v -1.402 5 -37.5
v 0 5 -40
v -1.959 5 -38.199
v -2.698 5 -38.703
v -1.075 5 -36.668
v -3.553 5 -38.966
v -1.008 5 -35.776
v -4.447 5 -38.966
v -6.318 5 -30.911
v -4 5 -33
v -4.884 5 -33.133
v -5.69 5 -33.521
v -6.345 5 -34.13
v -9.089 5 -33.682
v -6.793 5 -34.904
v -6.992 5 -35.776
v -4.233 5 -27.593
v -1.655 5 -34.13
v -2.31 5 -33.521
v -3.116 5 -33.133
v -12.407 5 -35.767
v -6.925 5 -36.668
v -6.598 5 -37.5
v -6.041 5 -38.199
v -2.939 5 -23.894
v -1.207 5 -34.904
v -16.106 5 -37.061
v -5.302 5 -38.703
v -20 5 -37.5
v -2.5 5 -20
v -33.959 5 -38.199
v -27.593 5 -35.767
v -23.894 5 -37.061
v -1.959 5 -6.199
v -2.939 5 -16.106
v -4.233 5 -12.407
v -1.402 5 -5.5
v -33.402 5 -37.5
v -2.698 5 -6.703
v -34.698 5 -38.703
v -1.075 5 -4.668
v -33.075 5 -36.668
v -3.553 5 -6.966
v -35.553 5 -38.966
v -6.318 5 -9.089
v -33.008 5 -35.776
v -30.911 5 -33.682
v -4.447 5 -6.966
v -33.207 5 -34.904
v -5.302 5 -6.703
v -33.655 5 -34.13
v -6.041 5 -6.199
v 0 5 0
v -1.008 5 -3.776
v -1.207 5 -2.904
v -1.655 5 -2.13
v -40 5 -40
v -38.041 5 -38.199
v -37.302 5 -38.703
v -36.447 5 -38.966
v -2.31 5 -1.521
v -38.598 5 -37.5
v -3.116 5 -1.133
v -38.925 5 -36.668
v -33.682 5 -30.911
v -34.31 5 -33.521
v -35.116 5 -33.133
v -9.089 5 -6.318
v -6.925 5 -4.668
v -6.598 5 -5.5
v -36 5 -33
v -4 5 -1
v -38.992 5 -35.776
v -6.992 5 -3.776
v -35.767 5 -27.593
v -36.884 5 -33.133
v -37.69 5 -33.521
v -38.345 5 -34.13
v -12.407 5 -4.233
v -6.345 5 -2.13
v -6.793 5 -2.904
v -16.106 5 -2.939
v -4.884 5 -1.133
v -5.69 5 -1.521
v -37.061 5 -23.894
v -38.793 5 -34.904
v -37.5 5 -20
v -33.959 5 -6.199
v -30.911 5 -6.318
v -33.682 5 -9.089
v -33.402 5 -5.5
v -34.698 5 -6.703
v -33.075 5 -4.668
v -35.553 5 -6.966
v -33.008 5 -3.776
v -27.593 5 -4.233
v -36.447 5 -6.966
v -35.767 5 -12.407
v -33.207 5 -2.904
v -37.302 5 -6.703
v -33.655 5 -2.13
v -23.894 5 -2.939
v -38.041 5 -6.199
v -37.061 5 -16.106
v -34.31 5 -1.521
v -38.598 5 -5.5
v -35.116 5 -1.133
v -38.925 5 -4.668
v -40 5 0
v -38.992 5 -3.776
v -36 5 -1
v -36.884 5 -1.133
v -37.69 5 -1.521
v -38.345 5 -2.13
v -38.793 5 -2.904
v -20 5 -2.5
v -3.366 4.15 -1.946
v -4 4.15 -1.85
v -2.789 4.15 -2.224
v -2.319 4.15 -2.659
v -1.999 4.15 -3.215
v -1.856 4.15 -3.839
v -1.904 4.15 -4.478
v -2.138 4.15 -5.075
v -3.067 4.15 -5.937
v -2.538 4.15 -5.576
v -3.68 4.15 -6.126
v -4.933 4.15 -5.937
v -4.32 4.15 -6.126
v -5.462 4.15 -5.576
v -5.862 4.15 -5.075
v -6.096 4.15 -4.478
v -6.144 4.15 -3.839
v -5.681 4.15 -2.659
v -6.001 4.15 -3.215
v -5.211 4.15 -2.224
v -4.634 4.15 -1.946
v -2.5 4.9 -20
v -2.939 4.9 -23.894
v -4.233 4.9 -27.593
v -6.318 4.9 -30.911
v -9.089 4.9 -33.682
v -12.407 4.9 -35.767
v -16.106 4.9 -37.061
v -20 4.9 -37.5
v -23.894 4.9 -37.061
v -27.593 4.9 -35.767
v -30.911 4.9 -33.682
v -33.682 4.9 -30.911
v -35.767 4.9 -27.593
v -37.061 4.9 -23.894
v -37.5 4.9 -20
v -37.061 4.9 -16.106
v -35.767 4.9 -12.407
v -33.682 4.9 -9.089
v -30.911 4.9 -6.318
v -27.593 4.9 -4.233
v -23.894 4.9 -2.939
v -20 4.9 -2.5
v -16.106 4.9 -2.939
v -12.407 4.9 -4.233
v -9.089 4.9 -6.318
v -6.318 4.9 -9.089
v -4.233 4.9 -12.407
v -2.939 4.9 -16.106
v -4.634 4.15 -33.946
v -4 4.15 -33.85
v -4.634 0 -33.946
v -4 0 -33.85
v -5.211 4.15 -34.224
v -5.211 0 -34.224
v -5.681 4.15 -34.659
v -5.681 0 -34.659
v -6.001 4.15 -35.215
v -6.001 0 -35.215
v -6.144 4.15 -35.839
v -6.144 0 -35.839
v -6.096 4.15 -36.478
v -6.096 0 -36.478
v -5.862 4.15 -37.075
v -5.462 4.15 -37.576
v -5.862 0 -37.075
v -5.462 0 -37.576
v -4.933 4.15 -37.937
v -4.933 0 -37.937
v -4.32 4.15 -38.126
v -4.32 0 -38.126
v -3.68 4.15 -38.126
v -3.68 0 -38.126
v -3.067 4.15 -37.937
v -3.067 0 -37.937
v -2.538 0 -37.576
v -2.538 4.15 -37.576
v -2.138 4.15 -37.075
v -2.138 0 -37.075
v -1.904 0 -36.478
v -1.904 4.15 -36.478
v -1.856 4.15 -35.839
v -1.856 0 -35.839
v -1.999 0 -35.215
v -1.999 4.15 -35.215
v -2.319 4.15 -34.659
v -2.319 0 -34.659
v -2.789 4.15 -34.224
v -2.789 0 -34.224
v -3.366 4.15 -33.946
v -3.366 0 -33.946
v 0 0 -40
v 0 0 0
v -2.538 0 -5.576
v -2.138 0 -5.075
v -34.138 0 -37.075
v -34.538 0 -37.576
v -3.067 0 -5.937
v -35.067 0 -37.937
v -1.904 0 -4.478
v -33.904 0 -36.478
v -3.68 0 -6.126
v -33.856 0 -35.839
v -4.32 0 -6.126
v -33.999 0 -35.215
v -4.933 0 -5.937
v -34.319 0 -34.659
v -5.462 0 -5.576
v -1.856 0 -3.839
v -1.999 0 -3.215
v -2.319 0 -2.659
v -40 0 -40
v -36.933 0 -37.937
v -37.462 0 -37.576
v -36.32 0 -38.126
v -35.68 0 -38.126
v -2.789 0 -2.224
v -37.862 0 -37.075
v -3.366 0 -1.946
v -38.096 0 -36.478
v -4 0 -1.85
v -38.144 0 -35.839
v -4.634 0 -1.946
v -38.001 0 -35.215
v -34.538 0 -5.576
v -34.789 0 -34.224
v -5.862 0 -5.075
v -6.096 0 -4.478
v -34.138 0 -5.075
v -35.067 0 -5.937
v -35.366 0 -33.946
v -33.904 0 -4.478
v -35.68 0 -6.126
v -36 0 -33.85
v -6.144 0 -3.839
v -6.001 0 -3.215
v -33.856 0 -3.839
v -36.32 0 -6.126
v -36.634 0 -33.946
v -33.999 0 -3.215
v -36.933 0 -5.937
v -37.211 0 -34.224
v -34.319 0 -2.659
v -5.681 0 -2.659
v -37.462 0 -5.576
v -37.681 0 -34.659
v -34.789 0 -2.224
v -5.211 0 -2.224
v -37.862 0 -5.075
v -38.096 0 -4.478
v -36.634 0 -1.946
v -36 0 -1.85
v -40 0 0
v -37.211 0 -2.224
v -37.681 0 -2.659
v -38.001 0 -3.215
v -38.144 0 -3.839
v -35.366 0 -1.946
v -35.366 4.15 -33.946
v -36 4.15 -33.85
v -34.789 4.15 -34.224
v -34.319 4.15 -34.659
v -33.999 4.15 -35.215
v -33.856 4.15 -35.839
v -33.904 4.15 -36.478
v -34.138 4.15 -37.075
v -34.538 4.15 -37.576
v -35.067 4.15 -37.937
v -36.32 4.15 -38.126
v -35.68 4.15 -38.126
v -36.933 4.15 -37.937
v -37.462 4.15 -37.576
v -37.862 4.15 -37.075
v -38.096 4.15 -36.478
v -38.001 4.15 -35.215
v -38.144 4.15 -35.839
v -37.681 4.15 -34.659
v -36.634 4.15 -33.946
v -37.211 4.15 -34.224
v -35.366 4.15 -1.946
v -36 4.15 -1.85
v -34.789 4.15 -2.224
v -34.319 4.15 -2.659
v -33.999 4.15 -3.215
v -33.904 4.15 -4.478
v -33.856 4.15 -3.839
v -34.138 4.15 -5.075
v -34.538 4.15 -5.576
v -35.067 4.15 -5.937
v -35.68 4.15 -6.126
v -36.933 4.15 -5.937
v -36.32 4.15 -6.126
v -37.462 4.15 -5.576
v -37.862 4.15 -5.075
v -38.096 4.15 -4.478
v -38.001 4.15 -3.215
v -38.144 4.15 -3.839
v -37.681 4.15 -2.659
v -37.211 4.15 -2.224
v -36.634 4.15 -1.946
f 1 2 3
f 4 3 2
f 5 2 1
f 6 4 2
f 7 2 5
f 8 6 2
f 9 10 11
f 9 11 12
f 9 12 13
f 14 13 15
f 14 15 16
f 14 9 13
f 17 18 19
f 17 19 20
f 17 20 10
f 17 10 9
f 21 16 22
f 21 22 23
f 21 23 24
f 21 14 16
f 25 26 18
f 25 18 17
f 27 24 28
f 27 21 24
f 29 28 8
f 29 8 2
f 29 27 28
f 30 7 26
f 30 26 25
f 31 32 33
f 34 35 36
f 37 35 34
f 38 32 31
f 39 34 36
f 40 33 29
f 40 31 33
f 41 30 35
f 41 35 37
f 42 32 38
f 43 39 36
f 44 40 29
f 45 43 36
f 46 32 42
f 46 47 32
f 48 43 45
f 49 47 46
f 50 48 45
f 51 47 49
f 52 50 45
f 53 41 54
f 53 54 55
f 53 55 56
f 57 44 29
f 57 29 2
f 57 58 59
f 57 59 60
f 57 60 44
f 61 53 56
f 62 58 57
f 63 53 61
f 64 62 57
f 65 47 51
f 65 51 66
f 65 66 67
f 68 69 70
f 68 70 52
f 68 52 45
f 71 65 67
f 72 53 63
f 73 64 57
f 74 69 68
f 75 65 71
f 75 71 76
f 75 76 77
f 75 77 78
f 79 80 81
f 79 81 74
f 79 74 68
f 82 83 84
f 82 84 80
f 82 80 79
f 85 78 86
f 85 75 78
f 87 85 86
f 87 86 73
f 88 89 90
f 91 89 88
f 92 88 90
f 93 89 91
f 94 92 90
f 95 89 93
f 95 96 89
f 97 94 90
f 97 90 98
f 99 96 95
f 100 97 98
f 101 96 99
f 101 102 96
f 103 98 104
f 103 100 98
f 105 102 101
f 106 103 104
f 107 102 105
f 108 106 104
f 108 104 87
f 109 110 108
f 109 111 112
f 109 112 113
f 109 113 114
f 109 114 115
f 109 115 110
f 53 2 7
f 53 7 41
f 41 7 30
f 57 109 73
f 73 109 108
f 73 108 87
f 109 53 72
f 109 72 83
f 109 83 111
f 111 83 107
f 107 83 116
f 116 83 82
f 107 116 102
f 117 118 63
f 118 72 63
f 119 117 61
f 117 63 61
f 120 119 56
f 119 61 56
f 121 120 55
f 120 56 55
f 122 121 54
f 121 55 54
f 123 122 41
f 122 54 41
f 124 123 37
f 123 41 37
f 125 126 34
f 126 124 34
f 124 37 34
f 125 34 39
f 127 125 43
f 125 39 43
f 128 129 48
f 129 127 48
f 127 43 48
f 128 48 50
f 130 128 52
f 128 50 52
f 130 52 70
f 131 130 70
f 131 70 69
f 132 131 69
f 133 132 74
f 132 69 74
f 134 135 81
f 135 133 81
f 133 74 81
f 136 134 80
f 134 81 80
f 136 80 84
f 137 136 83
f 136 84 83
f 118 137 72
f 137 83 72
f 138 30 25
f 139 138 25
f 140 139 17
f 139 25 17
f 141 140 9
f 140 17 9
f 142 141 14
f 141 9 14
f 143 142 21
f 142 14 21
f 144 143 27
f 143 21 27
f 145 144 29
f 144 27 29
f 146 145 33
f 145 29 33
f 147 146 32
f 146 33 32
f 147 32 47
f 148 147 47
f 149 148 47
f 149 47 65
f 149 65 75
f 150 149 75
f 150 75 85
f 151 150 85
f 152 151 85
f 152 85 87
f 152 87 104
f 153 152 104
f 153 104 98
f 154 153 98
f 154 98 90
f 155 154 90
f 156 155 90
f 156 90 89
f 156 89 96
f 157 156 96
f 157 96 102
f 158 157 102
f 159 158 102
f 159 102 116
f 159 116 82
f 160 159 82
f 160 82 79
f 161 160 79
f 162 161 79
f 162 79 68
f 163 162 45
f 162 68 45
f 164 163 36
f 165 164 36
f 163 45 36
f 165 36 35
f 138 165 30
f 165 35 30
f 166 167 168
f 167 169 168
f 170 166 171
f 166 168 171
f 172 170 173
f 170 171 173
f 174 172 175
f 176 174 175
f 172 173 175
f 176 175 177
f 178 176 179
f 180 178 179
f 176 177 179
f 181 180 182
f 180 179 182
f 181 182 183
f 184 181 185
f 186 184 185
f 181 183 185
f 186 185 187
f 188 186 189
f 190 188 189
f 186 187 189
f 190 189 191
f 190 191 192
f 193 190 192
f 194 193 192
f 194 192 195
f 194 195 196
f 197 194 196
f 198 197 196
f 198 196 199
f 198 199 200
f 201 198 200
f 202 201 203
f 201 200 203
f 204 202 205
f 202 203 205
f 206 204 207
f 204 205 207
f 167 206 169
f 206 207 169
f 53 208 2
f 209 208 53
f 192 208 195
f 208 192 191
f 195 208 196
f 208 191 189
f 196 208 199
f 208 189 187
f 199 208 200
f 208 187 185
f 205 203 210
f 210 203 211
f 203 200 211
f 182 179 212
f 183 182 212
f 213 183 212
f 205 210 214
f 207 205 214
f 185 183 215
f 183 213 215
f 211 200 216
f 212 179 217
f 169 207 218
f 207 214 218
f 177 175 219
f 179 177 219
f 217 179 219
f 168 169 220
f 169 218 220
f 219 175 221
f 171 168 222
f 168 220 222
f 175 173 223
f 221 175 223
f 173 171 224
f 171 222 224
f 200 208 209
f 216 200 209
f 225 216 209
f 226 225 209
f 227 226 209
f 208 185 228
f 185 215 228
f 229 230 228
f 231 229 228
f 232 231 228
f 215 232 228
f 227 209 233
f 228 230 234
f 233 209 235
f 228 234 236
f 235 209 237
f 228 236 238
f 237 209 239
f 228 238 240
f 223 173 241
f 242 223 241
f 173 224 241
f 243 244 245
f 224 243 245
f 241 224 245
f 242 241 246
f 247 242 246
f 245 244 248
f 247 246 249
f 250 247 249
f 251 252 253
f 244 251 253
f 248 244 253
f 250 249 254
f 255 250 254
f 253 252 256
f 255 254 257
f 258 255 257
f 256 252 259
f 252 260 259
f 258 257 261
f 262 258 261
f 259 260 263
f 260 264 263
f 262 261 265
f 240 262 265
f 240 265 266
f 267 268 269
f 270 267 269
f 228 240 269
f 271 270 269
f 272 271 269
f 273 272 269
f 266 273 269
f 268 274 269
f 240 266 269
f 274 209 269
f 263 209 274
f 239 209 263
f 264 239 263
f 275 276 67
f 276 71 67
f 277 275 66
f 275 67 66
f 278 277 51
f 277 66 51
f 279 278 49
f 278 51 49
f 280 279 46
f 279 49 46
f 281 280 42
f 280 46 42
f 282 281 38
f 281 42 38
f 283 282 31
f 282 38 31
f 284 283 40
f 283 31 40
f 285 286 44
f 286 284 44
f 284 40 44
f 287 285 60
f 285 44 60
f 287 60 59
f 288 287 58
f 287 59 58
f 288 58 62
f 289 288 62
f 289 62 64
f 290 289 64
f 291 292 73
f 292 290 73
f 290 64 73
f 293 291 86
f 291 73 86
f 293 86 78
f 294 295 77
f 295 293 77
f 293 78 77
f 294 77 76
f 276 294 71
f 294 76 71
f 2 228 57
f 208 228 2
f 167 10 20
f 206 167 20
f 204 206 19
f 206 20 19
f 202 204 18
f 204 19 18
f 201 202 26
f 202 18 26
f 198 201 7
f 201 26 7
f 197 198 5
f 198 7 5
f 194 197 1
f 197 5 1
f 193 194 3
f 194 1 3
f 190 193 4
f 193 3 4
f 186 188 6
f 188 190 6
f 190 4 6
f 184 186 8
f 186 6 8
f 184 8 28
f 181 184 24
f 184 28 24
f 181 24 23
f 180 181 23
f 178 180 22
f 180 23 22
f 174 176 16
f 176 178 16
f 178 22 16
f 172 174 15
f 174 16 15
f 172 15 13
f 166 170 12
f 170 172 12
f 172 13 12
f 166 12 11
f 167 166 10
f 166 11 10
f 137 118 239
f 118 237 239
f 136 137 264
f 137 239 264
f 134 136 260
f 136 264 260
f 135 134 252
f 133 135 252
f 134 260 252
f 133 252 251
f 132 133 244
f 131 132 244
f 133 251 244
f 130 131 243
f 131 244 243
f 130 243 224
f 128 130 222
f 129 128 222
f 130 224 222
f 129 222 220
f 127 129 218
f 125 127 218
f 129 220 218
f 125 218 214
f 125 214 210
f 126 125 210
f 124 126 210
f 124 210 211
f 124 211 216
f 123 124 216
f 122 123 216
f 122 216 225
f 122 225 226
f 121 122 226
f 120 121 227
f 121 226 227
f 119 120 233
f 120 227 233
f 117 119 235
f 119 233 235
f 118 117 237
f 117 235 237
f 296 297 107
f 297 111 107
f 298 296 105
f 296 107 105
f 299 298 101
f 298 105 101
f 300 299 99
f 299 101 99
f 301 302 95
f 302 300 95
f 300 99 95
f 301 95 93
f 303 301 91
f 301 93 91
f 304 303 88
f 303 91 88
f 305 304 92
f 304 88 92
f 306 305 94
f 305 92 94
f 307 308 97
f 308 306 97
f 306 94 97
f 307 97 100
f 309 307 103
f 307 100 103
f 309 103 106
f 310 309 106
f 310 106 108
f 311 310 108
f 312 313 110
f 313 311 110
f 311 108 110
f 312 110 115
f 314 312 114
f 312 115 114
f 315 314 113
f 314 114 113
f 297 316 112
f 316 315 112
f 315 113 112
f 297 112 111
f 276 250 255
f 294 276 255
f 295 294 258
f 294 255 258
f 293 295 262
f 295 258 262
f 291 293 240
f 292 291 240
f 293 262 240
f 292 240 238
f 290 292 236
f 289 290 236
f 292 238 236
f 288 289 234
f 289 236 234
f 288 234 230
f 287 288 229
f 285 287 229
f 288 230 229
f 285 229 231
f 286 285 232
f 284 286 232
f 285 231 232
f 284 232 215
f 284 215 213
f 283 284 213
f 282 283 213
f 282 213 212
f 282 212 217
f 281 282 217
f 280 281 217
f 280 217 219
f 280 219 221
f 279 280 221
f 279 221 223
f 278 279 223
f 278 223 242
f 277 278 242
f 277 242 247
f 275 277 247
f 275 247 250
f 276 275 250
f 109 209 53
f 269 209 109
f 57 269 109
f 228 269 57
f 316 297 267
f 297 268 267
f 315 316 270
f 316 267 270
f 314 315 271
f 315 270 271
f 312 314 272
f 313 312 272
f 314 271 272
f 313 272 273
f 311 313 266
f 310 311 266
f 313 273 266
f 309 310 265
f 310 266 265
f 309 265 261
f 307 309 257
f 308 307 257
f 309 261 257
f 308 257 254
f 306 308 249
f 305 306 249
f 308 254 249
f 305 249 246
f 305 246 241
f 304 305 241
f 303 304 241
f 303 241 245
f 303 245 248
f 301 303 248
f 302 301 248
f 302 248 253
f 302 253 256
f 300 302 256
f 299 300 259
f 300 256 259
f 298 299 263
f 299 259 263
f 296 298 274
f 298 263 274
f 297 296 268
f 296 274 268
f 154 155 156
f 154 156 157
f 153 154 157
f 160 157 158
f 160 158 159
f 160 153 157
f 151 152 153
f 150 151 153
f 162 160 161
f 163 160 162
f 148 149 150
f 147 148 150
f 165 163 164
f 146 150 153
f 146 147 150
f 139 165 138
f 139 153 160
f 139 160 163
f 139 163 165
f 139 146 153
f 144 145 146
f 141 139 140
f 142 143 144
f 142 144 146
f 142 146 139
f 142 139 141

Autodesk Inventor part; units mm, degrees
ref_plane "YZ Plane" through (0, 0, 0) normal (1, 0, 0) x (0, 1, 0)
ref_plane "XZ Plane" through (0, 0, 0) normal (0, 1, 0) x (-1, 0, 0)
ref_plane "XY Plane" through (0, 0, 0) normal (0, 0, 1) x (1, 0, 0)
sketch "Sketch1" plane through (0, 0, 0) normal (0, 1, 0) x (-1, 0, 0)
  line L0 (0, 0) -> (40, 0)
  line L1 (40, 0) -> (40, -40)
  line L2 (40, -40) -> (0, -40)
  line L3 (0, -40) -> (0, 0)
  dimension "d0" = 40
  dimension "d1" = 40
extrude "Extrusion1" add sketch "Sketch1" along normal blind 5
sketch "Sketch2" plane through (0, 5, 0) normal (0, 1, 0) x (1, 0, 0)
  line L0 (-40, 0) -> (0, 0) projected
  line L1 (0, 0) -> (0, 40) projected
  line L2 (0, 40) -> (-40, 40) projected
  line L3 (-40, 40) -> (-40, 0) projected
  point P0 (-4, 4)
  point P1 (-4, 36)
  point P2 (-36, 36)
  point P3 (-36, 4)
  dimension "d4" = 4
  dimension "d6" = 4
  dimension "d7" = 4
  dimension "d8" = 4
  dimension "d9" = 4
  dimension "d10" = 4
  dimension "d11" = 4
  dimension "d12" = 4
hole "Hole1" at (-4, 5, -4) at (-4, 5, -36) at (-36, 5, -36) at (-36, 5, -4) direction (0, -1, 0) diameter 4.3 end through all countersink diameter 6 countersink angle 90
sketch "Sketch3" plane through (0, 5, 0) normal (0, 1, 0) x (1, 0, 0)
  circle A0 centre (-20, 20) radius 17.5
  line L0 (-40, 0) -> (0, 0) projected
  line L1 (-40, 40) -> (-40, 0) projected
  dimension "d21" = 20
  dimension "d22" = 20
  dimension "d23" = 35
extrude "Extrusion2" cut sketch "Sketch3" against normal blind 0.1
equation "\"d4\" = d11"
equation "\"d6\" = d11"
equation "\"d7\" = d11"
equation "\"d8\" = d11"
equation "\"d9\" = d11"
equation "\"d10\" = d11"
equation "\"d12\" = d11"
properties part number "Filter"
